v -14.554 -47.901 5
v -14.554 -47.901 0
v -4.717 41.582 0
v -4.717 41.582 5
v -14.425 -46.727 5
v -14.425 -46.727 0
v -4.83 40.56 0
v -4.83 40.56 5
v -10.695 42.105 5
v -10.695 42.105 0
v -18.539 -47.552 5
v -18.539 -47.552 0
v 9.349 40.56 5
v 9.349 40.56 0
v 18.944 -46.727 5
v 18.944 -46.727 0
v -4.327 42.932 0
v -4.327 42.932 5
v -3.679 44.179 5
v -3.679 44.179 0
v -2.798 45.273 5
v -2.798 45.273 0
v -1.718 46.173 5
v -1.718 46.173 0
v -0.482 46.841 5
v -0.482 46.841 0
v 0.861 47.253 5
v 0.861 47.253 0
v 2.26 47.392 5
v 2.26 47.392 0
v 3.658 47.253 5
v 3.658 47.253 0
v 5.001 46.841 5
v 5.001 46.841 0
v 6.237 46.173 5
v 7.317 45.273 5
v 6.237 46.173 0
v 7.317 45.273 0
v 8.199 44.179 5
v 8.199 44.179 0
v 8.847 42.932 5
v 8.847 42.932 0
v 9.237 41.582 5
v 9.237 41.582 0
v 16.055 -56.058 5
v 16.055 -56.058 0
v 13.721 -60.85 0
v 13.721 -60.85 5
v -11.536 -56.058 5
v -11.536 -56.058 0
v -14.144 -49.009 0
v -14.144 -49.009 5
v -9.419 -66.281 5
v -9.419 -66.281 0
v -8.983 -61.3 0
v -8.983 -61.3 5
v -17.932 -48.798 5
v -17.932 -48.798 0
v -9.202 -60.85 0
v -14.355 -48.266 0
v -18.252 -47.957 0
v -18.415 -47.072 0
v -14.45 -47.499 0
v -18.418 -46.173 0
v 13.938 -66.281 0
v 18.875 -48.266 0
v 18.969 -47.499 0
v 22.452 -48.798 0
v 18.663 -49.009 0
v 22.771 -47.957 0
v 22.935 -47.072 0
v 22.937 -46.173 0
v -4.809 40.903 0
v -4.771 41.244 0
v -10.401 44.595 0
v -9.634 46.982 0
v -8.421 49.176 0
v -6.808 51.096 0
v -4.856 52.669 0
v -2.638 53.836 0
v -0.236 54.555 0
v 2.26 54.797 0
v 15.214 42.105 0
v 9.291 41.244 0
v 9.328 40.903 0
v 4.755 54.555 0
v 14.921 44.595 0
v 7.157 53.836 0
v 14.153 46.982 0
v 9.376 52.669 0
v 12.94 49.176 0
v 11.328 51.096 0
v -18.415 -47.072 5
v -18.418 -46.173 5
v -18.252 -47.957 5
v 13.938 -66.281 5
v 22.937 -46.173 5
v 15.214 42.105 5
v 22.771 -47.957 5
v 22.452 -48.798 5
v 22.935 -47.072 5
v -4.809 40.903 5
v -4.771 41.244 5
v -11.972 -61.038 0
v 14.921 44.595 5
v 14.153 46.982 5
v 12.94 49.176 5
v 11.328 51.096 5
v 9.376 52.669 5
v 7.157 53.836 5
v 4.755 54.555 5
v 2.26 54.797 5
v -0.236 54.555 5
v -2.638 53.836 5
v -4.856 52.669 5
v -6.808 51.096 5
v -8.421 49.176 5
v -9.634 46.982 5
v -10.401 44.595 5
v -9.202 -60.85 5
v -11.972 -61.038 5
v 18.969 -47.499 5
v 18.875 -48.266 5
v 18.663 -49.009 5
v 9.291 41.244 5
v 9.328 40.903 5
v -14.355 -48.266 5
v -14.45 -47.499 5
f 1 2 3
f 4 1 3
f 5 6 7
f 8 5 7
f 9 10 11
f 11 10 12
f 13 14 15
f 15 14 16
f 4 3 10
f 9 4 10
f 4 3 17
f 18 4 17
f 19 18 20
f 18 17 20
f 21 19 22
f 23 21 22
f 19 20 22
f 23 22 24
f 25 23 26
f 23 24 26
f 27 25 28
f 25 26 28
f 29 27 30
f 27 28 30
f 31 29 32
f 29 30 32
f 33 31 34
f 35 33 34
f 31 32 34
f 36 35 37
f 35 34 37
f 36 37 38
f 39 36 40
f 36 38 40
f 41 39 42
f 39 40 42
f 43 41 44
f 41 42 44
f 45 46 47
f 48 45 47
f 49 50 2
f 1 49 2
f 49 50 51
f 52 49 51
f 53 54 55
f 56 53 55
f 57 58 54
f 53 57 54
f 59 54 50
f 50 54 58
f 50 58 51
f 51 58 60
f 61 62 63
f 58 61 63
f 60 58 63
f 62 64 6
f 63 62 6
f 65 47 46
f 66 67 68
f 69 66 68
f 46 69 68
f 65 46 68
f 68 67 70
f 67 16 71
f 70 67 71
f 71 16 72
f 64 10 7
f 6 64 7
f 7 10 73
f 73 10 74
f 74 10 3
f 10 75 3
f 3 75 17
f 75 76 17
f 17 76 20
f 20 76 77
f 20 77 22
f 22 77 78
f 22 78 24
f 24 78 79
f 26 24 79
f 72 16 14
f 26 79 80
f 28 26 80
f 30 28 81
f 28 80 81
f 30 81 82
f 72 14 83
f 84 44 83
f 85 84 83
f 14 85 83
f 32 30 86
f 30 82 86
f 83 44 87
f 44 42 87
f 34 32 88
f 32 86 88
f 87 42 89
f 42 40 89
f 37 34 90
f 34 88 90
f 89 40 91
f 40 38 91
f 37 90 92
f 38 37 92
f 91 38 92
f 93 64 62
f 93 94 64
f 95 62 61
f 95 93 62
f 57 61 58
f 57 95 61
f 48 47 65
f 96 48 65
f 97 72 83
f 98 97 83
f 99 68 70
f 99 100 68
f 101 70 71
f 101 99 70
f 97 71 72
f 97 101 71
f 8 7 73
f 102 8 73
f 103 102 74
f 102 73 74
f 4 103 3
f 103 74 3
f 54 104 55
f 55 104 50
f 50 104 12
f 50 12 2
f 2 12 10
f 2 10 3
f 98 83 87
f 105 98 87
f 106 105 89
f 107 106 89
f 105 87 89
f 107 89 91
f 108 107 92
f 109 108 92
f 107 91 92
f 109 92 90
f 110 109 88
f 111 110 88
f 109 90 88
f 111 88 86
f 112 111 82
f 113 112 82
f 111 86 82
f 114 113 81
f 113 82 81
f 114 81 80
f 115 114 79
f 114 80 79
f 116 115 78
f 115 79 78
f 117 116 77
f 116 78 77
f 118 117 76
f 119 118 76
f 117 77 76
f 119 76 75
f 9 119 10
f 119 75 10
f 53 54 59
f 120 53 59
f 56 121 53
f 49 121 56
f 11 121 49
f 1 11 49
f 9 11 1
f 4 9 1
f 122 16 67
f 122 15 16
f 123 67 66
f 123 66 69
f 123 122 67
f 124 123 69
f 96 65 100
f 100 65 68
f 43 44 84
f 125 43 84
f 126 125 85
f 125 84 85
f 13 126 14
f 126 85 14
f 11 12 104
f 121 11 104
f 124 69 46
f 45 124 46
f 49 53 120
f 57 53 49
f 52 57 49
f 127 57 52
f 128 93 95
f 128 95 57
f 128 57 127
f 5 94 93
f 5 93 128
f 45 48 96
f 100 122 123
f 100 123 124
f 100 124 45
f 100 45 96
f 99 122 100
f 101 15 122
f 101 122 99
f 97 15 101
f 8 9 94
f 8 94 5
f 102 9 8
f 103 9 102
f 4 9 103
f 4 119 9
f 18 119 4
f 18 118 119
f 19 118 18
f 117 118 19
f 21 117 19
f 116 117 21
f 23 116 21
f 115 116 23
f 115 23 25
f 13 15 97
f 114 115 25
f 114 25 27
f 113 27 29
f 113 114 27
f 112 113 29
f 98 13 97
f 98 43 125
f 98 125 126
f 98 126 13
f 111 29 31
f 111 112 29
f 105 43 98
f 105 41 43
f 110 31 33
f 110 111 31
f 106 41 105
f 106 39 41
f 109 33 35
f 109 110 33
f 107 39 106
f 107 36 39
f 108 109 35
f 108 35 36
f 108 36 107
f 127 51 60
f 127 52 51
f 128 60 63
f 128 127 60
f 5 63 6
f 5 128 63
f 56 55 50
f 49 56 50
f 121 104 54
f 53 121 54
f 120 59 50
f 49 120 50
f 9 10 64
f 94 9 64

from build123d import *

# Parameters (mm, degrees)
F1_DEPTH = 5
F2_ANGLE = 5
F4_DEPTH = 5
F5_R     = 5


with BuildPart() as f1:
    # F0 (on Top) → F1 (new body)
    with BuildSketch(Plane.XY):
        Polygon((-3, -61.2802159786), (0, -66.2802159786), (0, -61.2802159786), (-3, -56.2802159786), (-6.7174363314, -48.4178220929), (-4.7174363314, 41.5821779071), (-10.7174363314, 41.5821779071), (-10.7174363314, -48.4178220929), align=None)
    extrude(amount=F1_DEPTH)


with BuildPart() as f1_1:
    # F2: moved
    add(f1.part.rotate(Axis((-4.7174363314, 41.5821779071, 2.5), (0, 0, -1)), F2_ANGLE))


with BuildPart() as f4:
    # F3 (on Top) → F4 (new body)
    with BuildSketch(Plane.XY):
        with BuildLine():
            ThreePointArc((9.236862883, 41.5821779071), (9.3115479095, 41.0733527812), (9.3491754611, 40.5604541271))
            Line((9.3491754611, 40.5604541271), (19.0732691264, -47.9010334357))
            Line((19.0732691264, -47.9010334357), (16.0552315415, -56.0575044635))
            Line((16.0552315415, -56.0575044635), (13.7213274164, -60.8504095992))
            Line((13.7213274164, -60.8504095992), (13.9382048747, -66.2809186727))
            Line((13.9382048747, -66.2809186727), (23.0580479188, -47.5524104647))
            Line((23.0580479188, -47.5524104647), (15.2140310715, 42.1051123636))
            ThreePointArc((15.2140310715, 42.1051123636), (2.2597132758, 54.7974558397), (-10.69460452, 42.1051123636))
            Line((-10.69460452, 42.1051123636), (-18.5386213673, -47.5524104647))
            Line((-18.5386213673, -47.5524104647), (-9.4187783231, -66.2809186727))
            Line((-9.4187783231, -66.2809186727), (-9.2019008648, -60.8504095992))
            Line((-9.2019008648, -60.8504095992), (-11.5358049899, -56.0575044635))
            Line((-11.5358049899, -56.0575044635), (-14.5538425749, -47.9010334357))
            Line((-14.5538425749, -47.9010334357), (-4.8297489096, 40.5604541271))
            ThreePointArc((-4.8297489096, 40.5604541271), (-4.7921213579, 41.0733527812), (-4.7174363314, 41.5821779071))
            ThreePointArc((-4.7174363314, 41.5821779071), (2.2597132758, 47.3924945109), (9.236862883, 41.5821779071))
        make_face()
    extrude(amount=F4_DEPTH)

    # F5
    f5_edges = [f4.edges().sort_by_distance(p)[0] for p in [
        (-18.538621, -47.55241, 2.5),
        (-14.553843, -47.901033, 2.5),
        (19.073269, -47.901033, 2.5),
        (23.058048, -47.55241, 2.5),
    ]]
    fillet(f5_edges, radius=F5_R)


solid = Compound([f1_1.part, f4.part])
